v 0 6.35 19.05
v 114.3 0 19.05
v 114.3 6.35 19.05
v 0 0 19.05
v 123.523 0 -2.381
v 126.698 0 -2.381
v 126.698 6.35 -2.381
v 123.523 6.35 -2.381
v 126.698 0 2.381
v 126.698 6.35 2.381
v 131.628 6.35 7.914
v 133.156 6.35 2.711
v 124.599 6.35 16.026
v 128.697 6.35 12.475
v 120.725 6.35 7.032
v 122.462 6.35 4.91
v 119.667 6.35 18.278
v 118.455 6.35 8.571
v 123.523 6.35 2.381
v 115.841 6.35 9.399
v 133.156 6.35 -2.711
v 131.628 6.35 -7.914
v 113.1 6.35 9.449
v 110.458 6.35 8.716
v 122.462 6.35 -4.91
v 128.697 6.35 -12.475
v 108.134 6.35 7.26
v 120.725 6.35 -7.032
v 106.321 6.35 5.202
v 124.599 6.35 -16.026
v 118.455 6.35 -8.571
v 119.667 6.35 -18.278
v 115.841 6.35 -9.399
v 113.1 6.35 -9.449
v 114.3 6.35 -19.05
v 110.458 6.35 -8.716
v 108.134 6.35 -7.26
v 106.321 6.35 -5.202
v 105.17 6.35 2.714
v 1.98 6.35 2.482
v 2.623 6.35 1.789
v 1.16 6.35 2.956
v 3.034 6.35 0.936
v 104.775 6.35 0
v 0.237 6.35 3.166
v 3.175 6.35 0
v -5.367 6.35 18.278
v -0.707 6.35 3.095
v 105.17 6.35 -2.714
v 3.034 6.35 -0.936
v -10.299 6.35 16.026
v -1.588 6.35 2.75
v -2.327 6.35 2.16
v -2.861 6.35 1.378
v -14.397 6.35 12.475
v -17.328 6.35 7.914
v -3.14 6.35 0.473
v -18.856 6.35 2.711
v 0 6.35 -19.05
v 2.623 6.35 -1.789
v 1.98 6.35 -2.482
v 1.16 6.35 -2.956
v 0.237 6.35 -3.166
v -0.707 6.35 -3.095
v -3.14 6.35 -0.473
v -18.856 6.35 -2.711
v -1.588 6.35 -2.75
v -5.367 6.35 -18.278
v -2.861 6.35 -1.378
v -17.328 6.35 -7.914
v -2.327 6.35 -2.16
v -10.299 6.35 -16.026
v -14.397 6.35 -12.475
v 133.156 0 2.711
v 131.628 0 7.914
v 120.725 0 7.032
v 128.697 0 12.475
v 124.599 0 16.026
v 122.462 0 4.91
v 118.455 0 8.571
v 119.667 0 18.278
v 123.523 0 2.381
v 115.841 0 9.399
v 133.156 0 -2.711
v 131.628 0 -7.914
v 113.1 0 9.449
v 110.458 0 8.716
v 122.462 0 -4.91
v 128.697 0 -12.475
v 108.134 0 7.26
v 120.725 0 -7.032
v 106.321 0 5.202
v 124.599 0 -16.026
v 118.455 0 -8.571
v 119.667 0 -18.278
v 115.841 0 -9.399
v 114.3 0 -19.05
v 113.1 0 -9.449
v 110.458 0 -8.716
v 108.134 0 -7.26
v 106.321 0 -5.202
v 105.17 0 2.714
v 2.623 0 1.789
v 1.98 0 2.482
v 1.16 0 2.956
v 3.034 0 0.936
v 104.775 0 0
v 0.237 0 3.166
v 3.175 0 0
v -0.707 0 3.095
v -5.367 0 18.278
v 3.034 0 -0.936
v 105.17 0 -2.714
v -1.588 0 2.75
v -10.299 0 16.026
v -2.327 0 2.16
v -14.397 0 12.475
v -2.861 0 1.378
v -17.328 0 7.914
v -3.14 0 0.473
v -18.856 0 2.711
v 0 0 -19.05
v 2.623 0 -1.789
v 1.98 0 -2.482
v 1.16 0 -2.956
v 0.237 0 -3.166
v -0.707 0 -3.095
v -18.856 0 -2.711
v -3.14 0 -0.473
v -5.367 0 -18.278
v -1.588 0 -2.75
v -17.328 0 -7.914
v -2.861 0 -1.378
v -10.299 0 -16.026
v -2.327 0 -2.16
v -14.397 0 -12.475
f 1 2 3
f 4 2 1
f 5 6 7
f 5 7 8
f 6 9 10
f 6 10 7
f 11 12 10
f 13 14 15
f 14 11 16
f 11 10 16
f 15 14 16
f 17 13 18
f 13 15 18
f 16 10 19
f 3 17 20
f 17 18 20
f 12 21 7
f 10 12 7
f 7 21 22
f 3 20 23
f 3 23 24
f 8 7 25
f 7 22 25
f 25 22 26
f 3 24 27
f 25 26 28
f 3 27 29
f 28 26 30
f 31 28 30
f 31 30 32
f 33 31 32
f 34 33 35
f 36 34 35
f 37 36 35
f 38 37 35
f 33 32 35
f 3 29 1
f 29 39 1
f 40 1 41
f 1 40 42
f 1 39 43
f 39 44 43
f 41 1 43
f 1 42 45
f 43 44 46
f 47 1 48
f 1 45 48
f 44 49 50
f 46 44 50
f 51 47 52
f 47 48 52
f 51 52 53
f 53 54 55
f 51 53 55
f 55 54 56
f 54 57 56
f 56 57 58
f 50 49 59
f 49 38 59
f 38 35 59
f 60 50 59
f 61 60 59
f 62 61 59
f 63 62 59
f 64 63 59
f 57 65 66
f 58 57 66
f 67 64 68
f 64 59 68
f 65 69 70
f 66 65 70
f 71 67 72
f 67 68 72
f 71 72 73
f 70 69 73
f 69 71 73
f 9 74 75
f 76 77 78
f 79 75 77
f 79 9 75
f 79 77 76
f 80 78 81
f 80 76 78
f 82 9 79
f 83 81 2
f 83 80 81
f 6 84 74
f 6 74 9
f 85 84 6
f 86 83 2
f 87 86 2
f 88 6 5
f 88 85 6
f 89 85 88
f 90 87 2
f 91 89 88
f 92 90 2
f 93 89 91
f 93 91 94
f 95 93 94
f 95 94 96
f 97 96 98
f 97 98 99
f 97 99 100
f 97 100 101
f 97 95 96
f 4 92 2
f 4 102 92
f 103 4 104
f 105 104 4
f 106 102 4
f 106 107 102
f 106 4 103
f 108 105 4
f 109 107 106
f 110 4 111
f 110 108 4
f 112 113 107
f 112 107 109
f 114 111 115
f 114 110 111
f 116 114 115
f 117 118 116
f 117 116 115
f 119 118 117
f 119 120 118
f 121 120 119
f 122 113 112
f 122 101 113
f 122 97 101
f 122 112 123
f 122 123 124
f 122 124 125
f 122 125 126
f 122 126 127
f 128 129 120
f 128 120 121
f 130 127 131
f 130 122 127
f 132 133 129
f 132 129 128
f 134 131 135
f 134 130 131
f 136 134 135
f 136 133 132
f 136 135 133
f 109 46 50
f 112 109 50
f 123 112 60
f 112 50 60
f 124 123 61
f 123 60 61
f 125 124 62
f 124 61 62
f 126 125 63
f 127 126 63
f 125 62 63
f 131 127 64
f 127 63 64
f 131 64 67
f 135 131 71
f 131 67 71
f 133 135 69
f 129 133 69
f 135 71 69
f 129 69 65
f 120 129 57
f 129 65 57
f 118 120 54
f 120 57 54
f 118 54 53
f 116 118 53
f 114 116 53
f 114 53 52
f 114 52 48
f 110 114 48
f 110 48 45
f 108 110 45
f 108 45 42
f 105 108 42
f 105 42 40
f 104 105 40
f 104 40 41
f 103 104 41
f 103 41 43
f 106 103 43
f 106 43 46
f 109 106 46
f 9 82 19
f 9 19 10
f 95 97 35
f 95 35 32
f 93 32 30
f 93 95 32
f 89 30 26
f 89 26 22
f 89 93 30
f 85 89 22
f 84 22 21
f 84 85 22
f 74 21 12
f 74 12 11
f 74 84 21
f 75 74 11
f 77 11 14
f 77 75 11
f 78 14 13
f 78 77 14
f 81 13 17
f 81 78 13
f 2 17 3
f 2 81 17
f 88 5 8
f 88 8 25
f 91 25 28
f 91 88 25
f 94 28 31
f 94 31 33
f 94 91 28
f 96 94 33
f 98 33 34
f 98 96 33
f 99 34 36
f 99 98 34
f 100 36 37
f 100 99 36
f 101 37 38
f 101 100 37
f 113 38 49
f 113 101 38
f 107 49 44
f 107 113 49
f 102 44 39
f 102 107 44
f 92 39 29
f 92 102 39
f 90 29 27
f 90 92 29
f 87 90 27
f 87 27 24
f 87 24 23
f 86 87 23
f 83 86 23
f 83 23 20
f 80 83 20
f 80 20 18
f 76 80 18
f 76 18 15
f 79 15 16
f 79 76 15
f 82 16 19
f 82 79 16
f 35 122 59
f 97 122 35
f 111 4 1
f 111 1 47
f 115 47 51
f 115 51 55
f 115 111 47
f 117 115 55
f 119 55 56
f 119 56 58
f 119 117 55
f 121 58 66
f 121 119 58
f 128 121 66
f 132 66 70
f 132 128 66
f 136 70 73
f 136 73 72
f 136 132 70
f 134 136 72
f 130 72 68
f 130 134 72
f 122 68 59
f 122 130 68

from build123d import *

# Parameters (mm, degrees)
BOSS_EXTRUDE1_DEPTH = 6.35
SKETCH3_R           = 3.175
CUT_EXTRUDE1_DEPTH  = 7.35


with BuildPart() as part:
    # Sketch1 → Boss-Extrude1 (new body)
    with BuildSketch(Plane(origin=(0, 0, 0), x_dir=(1, 0, 0), z_dir=(0, 1, 0))):
        with BuildLine():
            Line((0, 19.05), (114.3, 19.05))
            ThreePointArc((114.3, 19.05), (133.35, 0), (114.3, -19.05))
            Line((114.3, -19.05), (0, -19.05))
            ThreePointArc((0, -19.05), (-19.05, 0), (0, 19.05))
        make_face()
        with BuildLine():
            Line((123.522541593, -2.38125), (126.697541593, -2.38125))
            Line((126.697541593, -2.38125), (126.697541593, 2.38125))
            Line((126.697541593, 2.38125), (123.522541593, 2.38125))
            ThreePointArc((123.522541593, 2.38125), (104.775, 0), (123.522541593, -2.38125))
        make_face(mode=Mode.SUBTRACT)
    extrude(amount=BOSS_EXTRUDE1_DEPTH)

    # Sketch3 → Cut-Extrude1 (cut, through all)
    with BuildSketch(Plane(origin=(0, 6.35, 0), x_dir=(1, 0, 0), z_dir=(0, 1, 0))):
        Circle(SKETCH3_R)
    extrude(amount=-CUT_EXTRUDE1_DEPTH, mode=Mode.SUBTRACT)


solid = part.part
